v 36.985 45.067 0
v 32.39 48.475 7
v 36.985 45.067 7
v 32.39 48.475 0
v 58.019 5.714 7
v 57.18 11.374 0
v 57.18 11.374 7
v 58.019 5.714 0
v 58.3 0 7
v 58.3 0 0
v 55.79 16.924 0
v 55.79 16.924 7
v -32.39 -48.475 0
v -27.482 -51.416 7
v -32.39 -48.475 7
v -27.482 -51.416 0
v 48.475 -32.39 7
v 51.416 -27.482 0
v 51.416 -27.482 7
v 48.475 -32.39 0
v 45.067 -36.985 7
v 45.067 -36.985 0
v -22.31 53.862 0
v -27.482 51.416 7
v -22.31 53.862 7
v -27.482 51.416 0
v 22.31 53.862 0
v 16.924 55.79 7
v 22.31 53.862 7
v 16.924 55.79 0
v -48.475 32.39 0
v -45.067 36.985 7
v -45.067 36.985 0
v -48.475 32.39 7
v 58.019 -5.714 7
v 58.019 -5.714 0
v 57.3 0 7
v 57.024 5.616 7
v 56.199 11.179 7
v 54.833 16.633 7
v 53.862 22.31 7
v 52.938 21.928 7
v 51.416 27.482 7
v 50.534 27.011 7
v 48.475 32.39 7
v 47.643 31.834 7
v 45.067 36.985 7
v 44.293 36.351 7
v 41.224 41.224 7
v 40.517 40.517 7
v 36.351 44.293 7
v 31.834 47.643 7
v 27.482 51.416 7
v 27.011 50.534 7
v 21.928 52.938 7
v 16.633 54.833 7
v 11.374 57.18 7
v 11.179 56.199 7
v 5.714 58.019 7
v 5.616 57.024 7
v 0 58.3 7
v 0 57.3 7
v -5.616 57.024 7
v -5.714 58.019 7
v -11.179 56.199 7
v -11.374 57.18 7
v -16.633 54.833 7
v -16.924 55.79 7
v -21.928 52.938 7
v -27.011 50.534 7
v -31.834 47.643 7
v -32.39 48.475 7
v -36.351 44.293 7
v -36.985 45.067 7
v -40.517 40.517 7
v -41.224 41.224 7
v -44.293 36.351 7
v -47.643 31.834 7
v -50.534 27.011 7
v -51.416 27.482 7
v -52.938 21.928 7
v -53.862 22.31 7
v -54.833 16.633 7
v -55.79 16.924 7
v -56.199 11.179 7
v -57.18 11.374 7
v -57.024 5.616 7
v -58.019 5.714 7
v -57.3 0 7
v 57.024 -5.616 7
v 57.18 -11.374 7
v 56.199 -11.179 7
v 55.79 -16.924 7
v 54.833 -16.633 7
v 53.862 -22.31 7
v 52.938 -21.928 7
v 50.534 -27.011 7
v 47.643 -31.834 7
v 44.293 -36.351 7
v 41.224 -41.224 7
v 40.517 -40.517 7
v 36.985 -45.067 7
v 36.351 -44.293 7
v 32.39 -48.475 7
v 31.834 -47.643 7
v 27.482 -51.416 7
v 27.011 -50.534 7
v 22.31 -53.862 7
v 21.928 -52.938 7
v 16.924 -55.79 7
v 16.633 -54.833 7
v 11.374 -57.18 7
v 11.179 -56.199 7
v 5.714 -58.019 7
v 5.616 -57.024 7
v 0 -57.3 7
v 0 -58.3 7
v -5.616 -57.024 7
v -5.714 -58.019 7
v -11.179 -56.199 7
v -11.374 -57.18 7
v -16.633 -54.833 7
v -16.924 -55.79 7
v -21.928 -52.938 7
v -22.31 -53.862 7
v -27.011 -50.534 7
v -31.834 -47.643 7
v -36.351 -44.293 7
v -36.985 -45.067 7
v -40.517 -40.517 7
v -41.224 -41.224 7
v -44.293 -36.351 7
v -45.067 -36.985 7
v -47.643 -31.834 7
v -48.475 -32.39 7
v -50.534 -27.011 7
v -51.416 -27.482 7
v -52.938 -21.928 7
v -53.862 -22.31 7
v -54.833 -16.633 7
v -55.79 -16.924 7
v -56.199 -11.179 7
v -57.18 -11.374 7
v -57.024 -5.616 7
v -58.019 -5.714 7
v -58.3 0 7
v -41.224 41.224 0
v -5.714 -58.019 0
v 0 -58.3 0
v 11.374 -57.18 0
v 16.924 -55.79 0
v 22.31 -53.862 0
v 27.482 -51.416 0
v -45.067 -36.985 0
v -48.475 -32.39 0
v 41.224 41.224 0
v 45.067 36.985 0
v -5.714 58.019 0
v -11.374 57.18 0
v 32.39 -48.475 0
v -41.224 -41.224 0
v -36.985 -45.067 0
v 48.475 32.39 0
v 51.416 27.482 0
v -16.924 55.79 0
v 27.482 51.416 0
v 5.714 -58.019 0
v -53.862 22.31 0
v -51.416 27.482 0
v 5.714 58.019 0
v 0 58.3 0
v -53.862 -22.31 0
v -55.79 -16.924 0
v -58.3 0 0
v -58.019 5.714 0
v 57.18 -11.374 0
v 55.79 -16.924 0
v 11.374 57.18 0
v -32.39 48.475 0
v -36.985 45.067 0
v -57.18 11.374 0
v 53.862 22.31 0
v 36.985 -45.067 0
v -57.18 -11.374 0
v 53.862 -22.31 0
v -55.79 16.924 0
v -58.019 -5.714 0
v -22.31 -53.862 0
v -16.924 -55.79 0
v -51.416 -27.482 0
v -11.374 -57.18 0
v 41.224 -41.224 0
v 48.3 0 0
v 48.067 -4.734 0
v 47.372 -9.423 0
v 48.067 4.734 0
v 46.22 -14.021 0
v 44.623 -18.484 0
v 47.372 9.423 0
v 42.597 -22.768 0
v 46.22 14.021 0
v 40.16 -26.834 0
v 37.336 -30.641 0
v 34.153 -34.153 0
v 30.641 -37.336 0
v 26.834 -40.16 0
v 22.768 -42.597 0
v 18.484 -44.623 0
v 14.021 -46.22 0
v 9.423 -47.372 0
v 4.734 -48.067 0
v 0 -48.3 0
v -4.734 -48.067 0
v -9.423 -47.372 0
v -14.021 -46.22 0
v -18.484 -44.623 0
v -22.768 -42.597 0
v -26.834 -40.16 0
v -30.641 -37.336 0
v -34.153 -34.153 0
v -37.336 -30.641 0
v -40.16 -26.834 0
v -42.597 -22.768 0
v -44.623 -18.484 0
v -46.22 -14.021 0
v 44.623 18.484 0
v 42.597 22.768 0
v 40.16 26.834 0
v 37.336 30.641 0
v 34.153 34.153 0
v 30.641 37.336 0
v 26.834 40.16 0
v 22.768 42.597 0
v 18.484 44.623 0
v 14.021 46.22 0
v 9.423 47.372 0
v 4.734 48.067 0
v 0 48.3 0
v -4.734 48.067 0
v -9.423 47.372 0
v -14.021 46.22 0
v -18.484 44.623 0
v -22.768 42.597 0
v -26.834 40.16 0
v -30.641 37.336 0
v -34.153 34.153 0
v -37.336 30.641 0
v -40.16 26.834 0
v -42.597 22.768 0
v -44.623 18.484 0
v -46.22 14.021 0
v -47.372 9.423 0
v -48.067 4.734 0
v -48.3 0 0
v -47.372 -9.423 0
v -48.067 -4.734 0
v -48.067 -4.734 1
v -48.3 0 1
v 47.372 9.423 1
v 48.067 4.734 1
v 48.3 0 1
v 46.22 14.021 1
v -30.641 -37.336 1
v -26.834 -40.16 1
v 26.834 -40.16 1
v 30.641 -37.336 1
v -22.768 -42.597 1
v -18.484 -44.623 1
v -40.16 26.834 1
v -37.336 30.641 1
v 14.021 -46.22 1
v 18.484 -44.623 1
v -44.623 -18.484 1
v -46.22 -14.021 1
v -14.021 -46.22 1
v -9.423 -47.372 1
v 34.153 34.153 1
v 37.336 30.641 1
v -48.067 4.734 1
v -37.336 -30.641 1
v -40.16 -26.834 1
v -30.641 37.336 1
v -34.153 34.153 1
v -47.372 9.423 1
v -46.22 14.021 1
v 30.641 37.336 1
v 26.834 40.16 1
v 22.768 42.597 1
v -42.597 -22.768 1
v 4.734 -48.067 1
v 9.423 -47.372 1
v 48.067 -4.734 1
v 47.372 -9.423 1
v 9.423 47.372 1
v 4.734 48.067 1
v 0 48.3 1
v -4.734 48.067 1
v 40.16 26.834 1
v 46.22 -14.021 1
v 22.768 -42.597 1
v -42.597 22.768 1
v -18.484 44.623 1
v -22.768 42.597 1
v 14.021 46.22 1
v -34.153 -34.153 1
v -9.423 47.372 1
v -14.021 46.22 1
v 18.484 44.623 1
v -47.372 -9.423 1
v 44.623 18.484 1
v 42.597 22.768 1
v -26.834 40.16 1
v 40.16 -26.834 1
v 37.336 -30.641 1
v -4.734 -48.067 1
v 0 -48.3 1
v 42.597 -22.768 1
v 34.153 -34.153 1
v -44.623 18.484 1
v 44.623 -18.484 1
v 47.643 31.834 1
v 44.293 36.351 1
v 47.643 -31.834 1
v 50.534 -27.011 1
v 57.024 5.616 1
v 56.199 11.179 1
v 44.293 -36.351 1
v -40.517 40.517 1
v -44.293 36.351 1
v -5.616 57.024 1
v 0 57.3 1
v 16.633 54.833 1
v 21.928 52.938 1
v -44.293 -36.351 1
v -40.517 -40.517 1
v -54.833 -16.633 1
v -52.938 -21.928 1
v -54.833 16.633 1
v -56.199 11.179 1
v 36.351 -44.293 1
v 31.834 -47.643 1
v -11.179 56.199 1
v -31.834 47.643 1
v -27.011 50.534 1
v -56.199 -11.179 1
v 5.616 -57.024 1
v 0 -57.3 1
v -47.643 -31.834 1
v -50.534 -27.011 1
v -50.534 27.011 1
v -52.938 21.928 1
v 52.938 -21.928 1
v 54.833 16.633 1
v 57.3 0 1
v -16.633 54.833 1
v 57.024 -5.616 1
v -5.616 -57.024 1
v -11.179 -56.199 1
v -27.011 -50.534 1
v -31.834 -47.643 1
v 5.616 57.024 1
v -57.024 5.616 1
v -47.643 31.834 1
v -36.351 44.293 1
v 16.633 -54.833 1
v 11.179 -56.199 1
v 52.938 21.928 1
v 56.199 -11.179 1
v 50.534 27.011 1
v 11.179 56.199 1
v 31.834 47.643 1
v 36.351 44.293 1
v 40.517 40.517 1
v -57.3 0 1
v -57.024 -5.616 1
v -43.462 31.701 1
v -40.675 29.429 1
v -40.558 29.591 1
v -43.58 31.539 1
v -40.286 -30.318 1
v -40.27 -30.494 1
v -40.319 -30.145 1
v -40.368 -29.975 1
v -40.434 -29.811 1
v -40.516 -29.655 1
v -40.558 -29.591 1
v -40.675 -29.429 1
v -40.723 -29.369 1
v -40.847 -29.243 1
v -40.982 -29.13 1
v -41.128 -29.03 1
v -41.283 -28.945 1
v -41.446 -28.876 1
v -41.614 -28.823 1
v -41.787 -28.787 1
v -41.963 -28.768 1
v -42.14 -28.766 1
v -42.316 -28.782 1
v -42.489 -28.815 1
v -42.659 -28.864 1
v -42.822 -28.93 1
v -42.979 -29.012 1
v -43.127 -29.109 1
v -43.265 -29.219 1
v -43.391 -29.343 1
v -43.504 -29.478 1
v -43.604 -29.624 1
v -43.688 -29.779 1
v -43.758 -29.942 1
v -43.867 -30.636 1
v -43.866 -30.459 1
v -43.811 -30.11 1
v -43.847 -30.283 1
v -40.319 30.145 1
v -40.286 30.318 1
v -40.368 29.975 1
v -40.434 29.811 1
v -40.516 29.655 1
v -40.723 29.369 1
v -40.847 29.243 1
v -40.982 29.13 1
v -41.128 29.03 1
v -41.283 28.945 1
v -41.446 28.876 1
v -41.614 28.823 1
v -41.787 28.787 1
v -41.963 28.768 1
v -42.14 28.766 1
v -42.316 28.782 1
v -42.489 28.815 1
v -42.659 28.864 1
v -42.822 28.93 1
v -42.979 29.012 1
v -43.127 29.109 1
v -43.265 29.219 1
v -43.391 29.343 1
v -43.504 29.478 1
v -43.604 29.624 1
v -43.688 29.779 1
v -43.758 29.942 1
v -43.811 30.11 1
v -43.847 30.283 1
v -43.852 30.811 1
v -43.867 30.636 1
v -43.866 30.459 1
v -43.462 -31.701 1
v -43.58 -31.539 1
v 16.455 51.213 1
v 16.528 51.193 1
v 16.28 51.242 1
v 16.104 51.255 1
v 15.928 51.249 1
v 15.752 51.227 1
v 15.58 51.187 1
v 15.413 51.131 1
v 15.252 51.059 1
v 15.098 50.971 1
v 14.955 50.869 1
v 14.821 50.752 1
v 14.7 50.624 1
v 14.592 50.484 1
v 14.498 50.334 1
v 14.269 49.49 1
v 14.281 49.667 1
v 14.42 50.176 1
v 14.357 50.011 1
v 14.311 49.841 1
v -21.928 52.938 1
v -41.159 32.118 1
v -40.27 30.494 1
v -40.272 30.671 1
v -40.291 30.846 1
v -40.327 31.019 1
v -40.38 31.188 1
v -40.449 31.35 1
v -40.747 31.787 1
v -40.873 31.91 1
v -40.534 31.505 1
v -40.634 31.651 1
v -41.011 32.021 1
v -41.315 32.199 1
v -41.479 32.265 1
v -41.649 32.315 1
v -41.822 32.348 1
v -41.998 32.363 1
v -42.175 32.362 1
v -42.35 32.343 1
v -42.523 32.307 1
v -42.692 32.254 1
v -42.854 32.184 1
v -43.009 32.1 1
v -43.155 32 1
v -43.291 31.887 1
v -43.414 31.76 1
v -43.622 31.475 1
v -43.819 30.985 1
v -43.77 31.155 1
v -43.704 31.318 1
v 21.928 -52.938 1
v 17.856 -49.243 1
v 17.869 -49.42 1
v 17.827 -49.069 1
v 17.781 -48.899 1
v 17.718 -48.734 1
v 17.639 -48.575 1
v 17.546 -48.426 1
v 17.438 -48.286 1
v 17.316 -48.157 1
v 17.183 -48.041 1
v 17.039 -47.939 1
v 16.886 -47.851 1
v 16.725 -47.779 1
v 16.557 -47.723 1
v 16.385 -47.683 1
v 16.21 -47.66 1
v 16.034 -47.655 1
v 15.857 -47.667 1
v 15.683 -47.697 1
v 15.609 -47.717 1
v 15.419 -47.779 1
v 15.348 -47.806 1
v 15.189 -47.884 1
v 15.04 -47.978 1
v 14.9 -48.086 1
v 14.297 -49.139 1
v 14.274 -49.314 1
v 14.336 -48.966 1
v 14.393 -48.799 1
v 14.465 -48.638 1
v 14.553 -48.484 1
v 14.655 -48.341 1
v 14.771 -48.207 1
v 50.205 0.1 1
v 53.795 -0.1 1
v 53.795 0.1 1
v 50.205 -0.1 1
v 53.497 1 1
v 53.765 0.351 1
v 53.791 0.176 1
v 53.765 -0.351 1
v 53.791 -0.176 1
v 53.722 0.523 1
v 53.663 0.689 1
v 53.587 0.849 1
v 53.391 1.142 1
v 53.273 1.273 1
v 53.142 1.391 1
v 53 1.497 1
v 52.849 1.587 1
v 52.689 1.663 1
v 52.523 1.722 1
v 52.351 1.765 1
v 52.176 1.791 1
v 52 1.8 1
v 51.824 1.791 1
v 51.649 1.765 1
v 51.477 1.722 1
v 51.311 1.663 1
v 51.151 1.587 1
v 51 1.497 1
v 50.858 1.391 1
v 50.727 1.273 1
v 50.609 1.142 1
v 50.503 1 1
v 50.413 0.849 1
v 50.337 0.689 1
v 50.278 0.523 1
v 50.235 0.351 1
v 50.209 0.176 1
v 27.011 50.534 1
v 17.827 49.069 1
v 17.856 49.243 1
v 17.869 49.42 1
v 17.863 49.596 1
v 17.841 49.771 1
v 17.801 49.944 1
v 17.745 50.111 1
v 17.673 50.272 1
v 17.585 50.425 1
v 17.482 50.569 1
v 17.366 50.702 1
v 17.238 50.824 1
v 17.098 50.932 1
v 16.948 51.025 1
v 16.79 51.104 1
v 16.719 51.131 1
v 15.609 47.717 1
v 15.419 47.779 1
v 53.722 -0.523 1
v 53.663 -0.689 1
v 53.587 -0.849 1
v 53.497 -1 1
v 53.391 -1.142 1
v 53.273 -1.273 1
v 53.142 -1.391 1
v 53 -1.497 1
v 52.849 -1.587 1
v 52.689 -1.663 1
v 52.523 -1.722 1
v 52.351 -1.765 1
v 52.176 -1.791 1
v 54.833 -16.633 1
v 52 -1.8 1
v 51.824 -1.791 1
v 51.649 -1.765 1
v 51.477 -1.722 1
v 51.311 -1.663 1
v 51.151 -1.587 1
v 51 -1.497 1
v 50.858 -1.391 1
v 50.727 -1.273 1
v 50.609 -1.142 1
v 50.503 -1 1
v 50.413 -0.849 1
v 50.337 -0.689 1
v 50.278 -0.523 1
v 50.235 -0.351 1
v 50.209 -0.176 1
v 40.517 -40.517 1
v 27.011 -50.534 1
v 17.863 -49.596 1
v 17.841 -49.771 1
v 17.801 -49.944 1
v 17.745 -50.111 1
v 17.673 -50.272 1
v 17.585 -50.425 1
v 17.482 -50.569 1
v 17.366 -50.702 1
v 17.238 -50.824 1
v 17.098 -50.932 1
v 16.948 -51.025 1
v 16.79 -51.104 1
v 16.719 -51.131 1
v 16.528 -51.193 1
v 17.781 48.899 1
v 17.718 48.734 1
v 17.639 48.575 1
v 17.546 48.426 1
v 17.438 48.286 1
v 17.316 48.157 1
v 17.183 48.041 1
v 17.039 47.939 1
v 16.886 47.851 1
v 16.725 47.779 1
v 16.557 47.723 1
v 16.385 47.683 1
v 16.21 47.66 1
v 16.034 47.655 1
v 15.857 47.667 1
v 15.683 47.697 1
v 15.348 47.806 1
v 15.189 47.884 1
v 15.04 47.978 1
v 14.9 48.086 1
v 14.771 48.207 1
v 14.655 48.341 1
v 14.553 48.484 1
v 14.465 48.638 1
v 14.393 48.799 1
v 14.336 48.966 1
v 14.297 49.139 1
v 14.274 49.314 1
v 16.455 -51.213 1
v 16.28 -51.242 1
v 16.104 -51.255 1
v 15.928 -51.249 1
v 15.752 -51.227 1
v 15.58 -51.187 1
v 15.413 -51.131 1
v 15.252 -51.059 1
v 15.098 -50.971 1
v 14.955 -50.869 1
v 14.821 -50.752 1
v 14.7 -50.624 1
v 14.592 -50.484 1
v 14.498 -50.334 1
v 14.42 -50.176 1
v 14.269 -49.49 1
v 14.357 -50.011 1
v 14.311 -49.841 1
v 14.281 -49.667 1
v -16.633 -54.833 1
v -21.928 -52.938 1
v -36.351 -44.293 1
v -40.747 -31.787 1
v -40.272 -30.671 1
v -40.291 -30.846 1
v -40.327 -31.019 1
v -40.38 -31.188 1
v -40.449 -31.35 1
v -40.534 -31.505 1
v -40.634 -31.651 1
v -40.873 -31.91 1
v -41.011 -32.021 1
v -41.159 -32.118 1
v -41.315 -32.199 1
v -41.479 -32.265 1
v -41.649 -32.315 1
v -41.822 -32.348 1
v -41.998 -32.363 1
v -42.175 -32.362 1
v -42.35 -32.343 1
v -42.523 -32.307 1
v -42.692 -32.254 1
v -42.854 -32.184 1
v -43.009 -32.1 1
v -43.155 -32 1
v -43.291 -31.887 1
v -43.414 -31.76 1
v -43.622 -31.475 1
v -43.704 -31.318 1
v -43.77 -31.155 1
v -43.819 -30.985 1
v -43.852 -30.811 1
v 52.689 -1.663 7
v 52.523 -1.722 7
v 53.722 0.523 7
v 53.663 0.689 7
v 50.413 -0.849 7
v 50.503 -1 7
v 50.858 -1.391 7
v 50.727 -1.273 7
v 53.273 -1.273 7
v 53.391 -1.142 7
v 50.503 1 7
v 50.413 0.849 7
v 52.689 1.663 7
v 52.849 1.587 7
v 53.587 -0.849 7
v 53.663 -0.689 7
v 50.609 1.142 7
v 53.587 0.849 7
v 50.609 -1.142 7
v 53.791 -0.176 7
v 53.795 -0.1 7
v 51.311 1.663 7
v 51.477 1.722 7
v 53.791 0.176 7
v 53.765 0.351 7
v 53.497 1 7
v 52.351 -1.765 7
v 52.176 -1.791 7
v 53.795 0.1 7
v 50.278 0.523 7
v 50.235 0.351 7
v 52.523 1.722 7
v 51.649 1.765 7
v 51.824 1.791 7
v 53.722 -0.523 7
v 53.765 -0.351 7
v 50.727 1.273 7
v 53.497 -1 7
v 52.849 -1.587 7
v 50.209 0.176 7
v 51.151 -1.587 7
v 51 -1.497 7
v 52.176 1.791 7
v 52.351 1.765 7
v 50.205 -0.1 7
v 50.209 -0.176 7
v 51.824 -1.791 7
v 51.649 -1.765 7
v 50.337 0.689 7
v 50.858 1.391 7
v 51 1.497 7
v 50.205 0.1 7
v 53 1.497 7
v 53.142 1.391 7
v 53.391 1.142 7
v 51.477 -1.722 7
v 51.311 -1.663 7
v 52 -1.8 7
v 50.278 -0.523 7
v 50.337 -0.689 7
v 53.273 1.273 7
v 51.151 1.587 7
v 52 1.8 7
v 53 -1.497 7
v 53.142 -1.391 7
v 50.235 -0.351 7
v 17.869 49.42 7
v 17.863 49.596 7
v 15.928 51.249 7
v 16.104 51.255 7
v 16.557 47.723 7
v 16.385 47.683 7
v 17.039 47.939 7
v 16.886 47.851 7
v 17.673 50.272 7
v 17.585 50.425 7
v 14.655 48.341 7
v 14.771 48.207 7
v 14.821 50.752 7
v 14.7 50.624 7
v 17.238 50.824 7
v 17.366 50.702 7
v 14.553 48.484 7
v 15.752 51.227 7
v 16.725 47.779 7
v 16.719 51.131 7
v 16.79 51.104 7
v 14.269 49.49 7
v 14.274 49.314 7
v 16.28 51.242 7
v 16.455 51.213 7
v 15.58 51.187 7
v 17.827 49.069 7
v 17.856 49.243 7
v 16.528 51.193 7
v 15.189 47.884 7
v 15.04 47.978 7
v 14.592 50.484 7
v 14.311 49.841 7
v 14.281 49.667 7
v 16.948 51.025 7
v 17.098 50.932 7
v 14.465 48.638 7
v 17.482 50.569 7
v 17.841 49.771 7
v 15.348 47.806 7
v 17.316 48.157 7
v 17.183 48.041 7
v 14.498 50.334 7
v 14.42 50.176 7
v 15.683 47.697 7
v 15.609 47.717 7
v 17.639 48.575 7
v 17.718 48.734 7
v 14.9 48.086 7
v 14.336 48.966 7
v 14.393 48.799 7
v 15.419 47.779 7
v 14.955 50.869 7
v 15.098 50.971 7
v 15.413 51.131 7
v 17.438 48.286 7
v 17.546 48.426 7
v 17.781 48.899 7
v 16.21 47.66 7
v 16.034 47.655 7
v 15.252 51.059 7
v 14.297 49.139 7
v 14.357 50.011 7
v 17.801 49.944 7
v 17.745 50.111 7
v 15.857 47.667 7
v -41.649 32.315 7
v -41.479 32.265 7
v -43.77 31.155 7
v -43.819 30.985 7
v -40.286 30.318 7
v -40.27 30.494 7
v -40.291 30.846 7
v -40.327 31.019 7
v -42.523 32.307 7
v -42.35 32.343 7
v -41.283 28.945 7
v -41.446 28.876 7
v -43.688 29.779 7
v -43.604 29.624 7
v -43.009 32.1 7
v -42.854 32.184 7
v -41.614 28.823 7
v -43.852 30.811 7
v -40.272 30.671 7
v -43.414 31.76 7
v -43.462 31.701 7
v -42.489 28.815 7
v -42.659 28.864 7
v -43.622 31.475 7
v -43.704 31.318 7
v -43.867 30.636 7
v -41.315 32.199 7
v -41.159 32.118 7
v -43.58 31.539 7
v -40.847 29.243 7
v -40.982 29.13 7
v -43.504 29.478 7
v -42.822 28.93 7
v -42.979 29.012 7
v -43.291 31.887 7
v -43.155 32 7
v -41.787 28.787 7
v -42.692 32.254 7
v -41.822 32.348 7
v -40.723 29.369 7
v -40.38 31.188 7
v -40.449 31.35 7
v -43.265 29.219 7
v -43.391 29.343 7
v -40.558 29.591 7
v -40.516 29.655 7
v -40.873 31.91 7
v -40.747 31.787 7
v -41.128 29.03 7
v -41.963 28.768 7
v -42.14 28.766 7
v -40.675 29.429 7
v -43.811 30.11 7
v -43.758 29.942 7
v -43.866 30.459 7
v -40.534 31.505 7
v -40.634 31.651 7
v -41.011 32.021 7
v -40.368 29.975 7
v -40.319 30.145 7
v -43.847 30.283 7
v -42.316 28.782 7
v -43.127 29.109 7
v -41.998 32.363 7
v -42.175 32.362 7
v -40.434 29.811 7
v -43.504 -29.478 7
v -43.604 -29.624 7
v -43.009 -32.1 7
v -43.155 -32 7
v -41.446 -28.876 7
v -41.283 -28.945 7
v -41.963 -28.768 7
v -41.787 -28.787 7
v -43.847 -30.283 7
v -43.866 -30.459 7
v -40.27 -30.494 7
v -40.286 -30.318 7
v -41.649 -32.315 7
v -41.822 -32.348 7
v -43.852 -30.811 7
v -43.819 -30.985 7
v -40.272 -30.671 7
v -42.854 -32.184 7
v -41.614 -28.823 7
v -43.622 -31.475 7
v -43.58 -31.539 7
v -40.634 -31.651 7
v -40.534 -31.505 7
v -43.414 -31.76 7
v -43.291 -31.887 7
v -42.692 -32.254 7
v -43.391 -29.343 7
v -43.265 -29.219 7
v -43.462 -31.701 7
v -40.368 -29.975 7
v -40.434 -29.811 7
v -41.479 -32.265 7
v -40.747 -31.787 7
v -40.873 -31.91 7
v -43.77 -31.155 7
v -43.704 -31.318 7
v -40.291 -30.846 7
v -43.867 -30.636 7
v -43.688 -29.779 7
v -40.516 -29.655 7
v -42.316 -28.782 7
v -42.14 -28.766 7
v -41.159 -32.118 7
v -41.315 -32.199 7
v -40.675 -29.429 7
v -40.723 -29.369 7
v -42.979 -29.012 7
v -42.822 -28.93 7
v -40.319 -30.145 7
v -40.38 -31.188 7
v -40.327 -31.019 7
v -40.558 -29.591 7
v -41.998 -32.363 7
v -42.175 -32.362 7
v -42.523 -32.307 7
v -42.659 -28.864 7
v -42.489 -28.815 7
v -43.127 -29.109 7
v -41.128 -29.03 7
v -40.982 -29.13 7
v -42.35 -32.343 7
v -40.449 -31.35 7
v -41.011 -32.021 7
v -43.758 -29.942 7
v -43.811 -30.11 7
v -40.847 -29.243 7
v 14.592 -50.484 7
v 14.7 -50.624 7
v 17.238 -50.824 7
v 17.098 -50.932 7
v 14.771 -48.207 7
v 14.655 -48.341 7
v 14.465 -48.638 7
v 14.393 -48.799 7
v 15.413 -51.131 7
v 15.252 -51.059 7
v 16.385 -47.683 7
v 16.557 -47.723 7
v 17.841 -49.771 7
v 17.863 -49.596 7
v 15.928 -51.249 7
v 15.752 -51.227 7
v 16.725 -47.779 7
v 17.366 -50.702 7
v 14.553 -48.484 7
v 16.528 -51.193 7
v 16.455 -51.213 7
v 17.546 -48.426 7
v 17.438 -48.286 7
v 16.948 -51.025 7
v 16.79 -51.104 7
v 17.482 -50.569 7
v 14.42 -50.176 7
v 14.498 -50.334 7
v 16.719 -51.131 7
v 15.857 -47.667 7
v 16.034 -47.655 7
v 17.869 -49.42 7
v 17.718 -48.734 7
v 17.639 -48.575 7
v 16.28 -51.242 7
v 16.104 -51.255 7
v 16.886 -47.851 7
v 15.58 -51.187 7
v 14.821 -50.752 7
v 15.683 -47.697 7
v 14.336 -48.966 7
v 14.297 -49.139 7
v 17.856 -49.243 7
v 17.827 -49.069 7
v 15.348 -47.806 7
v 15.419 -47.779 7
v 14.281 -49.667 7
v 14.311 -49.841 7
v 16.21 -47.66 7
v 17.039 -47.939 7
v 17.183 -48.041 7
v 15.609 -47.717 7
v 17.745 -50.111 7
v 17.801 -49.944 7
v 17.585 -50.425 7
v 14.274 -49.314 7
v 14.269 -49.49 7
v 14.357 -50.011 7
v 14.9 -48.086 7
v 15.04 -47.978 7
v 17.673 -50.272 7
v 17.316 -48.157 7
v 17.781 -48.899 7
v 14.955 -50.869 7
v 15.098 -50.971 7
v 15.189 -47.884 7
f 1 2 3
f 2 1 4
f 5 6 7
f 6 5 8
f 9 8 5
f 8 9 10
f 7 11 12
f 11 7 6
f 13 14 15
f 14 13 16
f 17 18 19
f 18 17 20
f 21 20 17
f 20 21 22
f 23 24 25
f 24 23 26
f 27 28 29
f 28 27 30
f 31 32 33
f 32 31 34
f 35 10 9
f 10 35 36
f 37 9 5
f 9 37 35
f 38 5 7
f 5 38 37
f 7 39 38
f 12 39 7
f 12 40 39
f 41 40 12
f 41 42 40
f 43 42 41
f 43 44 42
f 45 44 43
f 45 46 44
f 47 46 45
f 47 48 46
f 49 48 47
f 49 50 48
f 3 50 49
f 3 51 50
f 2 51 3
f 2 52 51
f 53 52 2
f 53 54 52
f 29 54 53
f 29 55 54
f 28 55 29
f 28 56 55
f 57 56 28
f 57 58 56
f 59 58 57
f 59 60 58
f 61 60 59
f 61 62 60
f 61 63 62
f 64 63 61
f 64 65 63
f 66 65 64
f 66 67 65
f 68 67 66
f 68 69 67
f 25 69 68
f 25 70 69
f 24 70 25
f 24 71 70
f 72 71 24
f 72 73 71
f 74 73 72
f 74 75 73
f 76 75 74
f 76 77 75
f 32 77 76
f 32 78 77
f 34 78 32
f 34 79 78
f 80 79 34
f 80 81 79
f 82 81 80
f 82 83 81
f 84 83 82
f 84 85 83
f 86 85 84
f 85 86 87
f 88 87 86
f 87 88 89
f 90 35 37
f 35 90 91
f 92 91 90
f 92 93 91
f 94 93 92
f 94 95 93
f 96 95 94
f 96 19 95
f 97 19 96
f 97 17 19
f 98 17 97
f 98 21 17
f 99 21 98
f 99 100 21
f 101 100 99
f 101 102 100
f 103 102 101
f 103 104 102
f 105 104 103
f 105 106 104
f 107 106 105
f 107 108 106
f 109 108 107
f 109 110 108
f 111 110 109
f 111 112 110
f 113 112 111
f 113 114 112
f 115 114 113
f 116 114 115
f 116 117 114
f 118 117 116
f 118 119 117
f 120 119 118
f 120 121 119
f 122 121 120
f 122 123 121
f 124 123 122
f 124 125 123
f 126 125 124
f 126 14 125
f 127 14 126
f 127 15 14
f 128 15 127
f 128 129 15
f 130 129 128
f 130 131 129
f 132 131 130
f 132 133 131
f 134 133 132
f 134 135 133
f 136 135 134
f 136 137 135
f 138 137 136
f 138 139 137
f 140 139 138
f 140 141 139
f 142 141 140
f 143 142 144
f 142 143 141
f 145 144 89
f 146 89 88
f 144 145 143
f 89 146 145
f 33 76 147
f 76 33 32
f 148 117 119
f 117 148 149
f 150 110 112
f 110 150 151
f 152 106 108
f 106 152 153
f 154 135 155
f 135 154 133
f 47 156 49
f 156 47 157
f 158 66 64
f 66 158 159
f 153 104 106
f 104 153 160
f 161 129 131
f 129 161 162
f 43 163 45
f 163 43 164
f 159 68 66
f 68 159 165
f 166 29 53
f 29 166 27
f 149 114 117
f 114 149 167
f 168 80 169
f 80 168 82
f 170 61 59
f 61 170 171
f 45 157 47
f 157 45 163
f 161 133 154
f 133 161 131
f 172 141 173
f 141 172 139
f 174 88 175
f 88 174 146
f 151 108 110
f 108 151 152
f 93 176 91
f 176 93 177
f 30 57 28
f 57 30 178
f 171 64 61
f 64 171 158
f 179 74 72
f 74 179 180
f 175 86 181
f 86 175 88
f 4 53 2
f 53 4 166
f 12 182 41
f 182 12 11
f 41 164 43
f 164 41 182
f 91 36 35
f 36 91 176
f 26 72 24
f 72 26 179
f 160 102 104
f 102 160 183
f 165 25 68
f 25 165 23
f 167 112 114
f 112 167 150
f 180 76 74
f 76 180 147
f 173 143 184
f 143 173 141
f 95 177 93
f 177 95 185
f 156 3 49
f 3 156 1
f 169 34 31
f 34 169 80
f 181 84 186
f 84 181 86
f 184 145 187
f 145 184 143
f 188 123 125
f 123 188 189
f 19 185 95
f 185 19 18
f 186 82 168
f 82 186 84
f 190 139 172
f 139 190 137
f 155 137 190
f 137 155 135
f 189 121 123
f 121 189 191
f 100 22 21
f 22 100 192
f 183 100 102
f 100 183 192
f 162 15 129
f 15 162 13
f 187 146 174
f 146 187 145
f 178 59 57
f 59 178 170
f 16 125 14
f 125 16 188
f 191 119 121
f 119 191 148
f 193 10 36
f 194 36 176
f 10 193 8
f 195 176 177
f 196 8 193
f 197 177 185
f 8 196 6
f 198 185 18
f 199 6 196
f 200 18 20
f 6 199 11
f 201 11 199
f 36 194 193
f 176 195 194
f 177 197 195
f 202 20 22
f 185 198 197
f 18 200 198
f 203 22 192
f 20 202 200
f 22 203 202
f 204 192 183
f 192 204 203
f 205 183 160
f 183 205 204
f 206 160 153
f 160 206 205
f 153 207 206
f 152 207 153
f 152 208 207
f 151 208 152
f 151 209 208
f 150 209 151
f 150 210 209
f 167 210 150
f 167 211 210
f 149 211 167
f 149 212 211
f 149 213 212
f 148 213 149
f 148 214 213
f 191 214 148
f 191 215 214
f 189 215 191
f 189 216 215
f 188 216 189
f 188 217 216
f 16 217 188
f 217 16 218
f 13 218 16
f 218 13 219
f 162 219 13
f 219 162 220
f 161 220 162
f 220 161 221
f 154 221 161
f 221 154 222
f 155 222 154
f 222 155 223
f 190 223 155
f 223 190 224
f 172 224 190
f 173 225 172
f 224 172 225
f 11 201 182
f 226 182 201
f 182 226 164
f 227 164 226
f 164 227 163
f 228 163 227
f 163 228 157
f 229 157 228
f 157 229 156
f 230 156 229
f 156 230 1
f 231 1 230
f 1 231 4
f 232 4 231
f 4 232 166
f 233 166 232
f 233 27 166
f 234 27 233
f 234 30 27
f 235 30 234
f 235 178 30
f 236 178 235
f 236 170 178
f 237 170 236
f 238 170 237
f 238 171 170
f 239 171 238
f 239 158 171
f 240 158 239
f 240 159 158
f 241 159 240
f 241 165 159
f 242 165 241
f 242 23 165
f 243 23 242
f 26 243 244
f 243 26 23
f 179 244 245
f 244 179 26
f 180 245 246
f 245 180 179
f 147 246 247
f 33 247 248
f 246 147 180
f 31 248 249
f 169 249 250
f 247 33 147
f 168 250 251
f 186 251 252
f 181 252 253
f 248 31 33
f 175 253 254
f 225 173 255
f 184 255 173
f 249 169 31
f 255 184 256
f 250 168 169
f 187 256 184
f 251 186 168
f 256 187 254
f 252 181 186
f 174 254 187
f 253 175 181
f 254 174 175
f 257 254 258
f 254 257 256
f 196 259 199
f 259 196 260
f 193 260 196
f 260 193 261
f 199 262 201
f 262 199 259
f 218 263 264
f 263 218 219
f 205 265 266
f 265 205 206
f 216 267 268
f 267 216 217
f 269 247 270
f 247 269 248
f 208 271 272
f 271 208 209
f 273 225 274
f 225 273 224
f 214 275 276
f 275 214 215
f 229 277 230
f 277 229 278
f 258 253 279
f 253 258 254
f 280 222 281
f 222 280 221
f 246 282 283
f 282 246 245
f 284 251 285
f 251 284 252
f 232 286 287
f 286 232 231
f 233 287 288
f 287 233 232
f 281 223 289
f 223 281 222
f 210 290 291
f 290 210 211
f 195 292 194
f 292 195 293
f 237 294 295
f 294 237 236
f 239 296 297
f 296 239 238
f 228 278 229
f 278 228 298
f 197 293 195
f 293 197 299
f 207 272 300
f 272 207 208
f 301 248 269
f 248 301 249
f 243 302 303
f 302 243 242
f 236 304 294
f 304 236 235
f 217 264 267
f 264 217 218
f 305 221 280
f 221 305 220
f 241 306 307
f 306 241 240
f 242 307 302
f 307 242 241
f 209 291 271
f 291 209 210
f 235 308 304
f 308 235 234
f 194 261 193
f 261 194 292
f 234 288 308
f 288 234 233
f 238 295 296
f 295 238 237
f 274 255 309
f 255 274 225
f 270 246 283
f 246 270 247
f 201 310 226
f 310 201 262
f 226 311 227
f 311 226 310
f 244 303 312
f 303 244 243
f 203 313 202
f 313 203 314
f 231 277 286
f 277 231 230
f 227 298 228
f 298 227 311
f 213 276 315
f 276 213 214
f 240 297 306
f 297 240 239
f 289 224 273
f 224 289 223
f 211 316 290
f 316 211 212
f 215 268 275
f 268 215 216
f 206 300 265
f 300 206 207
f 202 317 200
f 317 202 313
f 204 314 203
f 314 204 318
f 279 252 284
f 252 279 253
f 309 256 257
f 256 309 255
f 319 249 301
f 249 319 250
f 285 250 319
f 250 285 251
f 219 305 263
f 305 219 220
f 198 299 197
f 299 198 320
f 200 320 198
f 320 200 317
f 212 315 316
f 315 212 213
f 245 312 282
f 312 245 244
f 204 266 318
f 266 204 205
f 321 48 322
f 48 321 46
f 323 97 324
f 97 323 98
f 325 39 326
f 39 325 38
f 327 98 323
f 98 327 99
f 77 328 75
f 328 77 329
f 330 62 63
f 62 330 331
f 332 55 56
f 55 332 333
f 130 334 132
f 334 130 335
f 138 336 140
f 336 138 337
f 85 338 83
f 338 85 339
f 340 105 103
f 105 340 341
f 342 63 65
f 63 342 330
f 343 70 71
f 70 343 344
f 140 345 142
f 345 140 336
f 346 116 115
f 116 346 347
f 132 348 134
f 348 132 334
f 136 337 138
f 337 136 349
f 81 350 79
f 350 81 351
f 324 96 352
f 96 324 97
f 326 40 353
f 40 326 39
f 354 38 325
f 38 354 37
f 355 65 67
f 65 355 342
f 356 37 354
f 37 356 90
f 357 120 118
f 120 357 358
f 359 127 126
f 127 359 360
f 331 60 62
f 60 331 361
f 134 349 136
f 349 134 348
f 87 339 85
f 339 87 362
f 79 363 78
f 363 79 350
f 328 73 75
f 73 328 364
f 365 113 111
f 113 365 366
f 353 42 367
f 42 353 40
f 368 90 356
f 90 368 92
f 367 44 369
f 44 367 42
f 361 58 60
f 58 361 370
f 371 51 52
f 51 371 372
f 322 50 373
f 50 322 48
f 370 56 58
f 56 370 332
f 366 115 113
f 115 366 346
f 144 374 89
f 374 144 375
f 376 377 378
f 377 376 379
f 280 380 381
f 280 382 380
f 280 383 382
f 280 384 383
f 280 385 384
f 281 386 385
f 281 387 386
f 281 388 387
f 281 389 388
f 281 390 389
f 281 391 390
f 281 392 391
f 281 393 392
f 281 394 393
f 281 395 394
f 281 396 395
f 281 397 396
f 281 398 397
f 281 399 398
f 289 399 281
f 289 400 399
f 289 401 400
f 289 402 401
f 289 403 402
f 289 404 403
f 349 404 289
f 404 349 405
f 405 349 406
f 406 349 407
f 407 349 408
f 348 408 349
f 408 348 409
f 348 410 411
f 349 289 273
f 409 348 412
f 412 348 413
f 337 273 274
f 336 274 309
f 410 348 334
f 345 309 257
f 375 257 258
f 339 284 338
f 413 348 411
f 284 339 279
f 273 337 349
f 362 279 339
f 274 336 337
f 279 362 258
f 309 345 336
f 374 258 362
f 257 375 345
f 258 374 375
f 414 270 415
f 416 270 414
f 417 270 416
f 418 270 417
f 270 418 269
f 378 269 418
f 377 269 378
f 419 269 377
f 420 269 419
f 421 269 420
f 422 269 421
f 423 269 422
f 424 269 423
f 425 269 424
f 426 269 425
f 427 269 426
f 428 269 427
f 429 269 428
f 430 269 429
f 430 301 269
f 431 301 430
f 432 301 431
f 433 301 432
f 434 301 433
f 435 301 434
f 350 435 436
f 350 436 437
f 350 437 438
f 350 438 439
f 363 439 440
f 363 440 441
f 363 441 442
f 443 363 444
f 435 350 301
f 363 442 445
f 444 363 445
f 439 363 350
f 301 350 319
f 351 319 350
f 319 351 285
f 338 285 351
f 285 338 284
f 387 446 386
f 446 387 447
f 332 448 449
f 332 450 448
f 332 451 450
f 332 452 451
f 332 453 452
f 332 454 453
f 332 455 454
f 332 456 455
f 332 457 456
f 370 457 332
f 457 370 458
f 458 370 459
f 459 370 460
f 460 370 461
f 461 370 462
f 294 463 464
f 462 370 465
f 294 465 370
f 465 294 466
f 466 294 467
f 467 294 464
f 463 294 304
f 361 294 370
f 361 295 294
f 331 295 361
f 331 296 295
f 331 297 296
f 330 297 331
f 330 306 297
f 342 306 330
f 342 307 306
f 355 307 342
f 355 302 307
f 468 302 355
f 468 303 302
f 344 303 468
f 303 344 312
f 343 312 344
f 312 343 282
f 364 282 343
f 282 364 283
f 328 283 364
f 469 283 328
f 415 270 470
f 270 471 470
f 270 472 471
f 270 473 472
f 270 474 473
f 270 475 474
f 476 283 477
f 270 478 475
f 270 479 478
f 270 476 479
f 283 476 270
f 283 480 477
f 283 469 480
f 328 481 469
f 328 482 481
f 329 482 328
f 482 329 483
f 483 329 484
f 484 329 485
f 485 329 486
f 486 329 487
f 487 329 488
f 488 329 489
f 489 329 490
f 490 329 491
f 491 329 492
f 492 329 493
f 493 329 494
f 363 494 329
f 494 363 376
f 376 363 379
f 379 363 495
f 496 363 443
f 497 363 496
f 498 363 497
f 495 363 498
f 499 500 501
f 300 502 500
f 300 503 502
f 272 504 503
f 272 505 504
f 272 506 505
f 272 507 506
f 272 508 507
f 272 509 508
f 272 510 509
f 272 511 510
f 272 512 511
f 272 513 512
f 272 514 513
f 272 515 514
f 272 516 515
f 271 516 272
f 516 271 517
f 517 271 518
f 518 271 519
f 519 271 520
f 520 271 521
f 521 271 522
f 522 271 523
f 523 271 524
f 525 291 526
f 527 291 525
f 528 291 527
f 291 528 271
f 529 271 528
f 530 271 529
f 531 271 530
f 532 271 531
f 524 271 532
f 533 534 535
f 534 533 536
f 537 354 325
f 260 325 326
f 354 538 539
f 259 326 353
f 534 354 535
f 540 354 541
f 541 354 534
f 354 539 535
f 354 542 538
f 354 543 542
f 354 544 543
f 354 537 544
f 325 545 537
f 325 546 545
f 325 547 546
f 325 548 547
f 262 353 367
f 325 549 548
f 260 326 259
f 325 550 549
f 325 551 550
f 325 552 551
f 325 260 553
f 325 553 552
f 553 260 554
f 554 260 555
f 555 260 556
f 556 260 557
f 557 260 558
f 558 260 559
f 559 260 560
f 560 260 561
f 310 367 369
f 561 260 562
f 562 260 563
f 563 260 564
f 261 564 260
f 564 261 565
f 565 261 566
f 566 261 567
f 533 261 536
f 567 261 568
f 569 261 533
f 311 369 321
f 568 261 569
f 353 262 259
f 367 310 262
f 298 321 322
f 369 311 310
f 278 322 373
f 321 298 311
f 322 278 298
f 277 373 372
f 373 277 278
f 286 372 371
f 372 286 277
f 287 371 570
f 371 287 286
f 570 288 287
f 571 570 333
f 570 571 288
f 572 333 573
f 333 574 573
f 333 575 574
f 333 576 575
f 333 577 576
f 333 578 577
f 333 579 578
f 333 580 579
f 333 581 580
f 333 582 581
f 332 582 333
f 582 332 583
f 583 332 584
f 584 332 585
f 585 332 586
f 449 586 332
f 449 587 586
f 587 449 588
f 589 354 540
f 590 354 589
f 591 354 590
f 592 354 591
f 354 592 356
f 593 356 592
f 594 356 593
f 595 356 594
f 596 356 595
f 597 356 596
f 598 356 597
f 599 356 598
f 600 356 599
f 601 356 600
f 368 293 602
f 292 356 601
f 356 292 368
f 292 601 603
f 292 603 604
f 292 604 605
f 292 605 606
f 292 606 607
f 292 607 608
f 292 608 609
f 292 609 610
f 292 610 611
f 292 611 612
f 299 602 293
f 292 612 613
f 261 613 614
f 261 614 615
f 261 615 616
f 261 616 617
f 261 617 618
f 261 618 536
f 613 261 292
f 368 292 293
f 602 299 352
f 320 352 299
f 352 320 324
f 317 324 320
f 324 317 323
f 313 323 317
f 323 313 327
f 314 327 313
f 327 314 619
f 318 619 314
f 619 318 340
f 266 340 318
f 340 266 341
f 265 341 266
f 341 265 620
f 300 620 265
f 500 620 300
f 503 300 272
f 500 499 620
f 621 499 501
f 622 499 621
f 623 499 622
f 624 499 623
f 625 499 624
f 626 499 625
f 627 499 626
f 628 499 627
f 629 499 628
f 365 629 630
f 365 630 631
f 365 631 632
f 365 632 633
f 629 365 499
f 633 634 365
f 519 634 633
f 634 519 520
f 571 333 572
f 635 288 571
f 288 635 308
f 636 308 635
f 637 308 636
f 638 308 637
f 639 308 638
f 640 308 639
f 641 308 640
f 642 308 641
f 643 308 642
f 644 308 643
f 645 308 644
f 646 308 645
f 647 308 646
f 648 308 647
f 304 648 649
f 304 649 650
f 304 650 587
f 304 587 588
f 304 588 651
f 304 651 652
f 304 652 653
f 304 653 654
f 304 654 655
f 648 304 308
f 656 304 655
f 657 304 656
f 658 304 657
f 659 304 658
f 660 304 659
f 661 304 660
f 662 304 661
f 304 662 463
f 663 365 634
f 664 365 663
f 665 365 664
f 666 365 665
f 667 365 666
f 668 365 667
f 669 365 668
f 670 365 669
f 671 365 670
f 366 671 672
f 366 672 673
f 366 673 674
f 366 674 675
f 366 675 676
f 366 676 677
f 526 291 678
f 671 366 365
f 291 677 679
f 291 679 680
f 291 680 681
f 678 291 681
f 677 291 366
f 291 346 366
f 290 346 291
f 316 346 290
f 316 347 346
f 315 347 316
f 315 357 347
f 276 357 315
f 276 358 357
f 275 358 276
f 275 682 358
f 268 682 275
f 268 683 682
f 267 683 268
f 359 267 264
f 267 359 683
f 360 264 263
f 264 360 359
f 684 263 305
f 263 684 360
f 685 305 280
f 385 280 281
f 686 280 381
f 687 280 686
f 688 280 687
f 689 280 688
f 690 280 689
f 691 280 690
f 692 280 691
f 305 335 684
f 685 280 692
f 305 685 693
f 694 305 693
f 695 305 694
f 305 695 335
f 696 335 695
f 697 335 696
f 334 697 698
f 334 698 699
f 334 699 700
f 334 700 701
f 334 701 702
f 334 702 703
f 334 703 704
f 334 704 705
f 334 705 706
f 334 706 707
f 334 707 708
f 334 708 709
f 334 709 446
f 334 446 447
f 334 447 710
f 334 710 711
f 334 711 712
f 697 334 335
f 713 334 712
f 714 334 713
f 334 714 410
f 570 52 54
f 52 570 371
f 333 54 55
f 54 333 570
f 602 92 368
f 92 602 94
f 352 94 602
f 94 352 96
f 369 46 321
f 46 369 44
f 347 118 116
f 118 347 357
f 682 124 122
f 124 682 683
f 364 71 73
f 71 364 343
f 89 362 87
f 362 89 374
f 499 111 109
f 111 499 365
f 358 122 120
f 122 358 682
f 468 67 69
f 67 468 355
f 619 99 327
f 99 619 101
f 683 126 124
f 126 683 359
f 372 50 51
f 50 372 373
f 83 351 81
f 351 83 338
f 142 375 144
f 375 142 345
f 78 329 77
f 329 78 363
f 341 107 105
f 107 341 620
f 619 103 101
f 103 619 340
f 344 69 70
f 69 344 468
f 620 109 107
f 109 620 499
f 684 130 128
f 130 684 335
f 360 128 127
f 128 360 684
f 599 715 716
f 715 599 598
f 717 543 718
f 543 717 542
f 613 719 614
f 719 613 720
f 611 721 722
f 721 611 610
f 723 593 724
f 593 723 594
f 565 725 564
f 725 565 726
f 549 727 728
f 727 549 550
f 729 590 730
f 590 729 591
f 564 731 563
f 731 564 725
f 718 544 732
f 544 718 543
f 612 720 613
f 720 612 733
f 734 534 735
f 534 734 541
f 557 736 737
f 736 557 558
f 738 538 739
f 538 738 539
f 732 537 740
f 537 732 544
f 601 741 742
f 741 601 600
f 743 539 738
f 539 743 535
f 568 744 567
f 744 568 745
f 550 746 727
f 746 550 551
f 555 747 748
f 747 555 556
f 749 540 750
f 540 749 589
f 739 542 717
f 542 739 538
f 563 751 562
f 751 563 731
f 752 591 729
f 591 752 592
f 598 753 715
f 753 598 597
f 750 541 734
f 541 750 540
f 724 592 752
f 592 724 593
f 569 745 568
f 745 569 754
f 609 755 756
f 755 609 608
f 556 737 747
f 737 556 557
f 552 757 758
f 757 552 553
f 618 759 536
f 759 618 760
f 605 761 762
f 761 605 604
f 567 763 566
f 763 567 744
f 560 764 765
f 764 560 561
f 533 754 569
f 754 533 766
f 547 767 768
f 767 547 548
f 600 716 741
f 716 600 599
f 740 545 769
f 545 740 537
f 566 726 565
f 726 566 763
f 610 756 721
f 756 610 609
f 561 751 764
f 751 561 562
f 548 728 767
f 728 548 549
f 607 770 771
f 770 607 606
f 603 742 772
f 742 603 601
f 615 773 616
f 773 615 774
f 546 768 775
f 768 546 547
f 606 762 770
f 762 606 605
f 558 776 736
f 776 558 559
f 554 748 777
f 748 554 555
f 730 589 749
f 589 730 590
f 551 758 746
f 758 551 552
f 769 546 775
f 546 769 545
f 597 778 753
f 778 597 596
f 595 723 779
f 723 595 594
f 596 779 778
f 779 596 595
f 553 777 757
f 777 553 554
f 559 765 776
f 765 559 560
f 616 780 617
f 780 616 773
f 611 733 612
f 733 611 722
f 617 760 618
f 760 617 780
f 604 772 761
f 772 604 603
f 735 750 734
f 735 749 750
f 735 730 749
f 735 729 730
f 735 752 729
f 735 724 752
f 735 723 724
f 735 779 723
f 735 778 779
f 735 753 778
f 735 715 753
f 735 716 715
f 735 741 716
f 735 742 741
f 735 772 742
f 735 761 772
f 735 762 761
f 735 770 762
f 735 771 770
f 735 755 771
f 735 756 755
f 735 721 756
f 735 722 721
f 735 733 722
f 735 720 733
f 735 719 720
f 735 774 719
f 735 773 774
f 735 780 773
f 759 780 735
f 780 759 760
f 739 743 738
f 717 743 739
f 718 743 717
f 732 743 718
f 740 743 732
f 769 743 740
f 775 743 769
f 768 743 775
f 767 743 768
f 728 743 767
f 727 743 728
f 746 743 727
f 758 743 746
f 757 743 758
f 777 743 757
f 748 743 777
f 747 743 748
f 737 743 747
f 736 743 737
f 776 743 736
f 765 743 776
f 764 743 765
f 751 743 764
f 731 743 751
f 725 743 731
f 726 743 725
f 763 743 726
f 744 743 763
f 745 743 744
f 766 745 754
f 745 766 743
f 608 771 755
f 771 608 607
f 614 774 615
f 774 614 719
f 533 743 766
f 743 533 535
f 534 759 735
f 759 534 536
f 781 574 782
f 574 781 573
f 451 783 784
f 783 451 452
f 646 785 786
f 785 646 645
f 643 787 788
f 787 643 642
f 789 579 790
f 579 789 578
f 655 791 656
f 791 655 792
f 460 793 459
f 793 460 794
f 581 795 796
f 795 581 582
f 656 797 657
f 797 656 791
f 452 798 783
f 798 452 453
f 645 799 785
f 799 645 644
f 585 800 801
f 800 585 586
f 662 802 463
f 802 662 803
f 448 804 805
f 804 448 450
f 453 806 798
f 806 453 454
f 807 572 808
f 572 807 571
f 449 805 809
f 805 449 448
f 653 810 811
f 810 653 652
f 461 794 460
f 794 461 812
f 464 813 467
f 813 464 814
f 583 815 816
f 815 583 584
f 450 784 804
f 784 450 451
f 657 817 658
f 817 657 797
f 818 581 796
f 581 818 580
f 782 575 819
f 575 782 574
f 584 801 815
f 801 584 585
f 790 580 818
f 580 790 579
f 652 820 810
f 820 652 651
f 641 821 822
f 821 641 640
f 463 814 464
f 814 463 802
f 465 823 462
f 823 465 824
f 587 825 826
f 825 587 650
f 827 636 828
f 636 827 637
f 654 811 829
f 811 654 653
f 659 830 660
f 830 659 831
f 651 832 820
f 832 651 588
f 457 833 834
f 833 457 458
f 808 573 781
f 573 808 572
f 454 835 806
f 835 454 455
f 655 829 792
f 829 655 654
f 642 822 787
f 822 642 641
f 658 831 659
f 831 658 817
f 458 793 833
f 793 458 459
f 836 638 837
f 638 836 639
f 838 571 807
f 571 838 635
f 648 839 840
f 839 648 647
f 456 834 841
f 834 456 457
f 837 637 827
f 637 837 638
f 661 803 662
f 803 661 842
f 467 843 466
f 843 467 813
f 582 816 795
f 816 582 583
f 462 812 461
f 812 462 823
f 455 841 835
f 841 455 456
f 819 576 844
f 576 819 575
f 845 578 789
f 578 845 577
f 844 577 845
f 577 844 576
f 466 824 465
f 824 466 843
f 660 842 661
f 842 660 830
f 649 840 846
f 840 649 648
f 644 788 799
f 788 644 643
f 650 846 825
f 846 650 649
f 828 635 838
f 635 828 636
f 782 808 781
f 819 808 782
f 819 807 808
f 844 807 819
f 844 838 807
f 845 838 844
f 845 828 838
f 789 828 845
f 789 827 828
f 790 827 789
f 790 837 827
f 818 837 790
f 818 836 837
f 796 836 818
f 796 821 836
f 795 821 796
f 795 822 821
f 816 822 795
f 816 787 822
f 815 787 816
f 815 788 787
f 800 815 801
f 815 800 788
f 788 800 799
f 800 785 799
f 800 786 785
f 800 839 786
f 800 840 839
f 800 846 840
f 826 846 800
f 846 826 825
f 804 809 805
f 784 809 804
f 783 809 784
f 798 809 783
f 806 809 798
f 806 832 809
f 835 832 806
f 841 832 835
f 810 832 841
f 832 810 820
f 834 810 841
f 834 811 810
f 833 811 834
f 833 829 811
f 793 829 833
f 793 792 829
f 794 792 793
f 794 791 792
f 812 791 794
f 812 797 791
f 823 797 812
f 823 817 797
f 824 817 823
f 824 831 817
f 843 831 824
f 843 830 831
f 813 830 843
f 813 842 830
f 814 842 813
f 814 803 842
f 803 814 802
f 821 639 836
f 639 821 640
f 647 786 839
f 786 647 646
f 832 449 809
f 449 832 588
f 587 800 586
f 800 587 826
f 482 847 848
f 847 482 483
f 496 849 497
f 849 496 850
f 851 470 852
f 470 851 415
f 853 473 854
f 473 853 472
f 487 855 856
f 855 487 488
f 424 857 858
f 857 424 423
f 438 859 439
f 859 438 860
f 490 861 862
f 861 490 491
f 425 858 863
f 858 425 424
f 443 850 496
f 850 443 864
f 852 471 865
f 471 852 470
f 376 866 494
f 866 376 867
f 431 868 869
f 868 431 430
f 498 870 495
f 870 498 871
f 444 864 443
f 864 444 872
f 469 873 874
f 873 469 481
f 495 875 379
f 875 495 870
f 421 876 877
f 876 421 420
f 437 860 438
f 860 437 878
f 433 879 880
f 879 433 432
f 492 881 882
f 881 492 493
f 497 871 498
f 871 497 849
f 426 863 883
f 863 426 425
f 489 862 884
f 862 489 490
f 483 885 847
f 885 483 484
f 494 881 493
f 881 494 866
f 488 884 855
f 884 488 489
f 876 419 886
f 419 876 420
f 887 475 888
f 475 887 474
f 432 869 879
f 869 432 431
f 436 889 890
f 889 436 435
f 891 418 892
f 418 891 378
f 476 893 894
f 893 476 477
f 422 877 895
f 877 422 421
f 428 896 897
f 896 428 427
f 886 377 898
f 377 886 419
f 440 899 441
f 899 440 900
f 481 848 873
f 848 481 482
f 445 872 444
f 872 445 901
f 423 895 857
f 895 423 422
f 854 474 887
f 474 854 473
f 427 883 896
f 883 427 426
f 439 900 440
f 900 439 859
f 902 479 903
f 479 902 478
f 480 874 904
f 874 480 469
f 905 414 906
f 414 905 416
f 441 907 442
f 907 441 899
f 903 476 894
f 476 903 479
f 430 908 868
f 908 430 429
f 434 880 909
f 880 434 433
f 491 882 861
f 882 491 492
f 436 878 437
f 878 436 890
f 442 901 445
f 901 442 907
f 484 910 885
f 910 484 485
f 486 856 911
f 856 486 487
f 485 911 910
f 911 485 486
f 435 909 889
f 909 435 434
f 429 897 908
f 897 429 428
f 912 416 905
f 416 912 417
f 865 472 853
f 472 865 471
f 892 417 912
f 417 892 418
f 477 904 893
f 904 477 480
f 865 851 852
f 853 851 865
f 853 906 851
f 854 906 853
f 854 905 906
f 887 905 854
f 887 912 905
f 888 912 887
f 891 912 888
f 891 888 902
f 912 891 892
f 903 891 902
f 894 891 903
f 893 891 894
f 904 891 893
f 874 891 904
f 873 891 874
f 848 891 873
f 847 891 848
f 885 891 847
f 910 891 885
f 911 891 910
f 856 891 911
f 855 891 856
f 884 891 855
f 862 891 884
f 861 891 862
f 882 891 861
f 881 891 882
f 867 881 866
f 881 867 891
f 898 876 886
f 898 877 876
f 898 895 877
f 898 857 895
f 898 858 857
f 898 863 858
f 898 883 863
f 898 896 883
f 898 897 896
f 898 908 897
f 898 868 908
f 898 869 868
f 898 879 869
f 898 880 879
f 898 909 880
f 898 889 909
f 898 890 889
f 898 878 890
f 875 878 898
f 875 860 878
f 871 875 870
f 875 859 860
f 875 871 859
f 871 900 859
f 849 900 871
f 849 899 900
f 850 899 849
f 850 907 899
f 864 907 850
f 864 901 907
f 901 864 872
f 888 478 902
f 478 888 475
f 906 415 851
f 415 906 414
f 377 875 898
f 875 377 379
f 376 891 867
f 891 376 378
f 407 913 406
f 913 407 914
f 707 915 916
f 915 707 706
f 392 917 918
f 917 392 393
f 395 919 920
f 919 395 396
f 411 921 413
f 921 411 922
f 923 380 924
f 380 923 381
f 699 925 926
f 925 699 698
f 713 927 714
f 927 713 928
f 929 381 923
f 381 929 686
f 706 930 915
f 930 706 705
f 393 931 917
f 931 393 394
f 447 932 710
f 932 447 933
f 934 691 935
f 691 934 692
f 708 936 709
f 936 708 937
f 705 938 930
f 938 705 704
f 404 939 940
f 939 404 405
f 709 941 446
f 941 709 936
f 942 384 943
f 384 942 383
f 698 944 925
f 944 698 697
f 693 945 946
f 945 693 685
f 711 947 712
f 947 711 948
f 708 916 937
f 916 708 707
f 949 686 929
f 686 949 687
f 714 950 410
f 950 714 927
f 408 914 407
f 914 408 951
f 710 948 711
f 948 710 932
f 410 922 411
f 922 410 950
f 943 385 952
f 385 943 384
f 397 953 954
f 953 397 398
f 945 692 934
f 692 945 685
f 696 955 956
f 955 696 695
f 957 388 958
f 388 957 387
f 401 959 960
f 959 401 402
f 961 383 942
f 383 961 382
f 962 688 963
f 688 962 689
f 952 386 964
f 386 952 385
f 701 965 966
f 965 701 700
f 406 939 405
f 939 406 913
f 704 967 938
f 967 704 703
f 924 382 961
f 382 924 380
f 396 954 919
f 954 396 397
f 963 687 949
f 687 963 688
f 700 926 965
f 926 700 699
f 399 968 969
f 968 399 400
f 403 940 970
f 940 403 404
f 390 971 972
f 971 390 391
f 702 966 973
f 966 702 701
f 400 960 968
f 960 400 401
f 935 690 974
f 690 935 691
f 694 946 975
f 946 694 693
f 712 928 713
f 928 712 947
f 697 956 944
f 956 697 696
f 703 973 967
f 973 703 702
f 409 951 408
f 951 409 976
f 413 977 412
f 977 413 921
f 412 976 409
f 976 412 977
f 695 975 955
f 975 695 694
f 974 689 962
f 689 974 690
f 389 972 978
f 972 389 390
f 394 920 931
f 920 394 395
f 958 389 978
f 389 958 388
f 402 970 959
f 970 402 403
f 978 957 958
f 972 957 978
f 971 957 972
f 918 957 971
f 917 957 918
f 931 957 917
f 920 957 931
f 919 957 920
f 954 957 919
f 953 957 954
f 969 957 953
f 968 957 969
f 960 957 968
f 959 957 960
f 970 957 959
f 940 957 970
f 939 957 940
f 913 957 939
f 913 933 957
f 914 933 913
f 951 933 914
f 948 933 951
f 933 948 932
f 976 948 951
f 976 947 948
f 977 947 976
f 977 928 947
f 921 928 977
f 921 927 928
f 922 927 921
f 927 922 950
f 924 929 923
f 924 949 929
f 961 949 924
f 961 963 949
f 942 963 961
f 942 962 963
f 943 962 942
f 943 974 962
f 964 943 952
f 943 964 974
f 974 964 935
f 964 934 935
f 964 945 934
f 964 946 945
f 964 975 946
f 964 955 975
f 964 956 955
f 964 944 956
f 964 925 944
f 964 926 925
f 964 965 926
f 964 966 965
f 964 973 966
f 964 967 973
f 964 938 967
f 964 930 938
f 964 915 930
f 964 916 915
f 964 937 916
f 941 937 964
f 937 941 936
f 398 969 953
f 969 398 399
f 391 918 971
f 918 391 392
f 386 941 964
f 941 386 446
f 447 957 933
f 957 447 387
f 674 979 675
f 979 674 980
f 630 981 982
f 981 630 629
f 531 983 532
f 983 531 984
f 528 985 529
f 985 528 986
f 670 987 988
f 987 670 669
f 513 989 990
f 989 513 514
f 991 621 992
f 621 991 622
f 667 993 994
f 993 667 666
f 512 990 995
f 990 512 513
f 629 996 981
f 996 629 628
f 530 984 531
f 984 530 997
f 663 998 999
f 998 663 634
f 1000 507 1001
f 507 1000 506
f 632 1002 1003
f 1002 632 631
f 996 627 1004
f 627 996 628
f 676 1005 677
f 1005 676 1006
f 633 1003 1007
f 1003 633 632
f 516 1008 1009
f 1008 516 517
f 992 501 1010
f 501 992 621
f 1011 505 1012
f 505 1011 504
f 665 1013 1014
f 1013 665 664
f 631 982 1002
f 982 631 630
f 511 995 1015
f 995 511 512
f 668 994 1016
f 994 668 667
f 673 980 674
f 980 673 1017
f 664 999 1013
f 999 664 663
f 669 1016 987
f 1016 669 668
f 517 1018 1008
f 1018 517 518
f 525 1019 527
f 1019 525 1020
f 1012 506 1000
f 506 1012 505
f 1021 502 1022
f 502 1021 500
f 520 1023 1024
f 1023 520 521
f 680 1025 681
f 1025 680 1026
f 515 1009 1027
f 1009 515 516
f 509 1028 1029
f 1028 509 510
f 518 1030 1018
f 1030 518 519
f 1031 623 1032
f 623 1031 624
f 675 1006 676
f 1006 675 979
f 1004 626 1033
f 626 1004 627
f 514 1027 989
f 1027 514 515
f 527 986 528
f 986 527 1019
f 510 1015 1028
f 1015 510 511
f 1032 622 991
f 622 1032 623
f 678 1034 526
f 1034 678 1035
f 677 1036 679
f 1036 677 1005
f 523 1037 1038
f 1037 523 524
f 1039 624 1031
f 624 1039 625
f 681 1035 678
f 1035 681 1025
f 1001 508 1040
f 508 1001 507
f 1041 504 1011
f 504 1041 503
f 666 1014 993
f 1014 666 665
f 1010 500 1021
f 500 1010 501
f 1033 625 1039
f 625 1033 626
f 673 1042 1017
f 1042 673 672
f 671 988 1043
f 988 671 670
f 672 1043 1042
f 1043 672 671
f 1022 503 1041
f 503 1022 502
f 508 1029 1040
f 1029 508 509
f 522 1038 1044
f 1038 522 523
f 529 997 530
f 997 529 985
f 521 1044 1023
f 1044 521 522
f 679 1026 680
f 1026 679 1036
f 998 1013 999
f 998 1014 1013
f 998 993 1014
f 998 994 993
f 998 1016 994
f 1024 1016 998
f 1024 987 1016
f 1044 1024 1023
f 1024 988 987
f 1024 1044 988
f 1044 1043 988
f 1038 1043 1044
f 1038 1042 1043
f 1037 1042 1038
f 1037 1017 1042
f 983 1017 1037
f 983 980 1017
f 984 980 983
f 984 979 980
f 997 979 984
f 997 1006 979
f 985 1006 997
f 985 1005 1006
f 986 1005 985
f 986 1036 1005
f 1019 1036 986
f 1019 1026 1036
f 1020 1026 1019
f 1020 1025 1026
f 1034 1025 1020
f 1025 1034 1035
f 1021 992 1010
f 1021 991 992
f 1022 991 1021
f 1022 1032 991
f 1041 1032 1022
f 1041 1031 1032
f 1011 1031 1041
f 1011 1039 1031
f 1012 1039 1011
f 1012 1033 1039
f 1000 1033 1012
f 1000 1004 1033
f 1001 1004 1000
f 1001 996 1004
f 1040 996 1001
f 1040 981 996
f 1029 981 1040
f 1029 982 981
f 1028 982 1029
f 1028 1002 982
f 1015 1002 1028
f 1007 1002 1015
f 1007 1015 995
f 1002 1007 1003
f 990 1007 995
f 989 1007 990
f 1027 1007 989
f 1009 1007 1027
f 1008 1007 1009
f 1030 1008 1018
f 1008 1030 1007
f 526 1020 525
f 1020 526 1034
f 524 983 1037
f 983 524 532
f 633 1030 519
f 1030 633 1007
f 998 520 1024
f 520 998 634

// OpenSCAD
$fn = 64;
epsilon = 0.01;

module bolt(boltRadius, boltGap, boltHeight) {
    difference() {
        cylinder(r = boltRadius, h = boltHeight);
        translate([-boltRadius, -boltGap / 2, -epsilon])
            cube([boltRadius * 2, boltGap, boltHeight + (2 * epsilon)]);
    }
}

module popFilterCap(capRadius, capHeight, floorThickness, wallThickness, floorExtent, boltRadius, boltGap, boltDistance, numBolts, boltDegreeOffset) {
    difference() {
        cylinder(r = capRadius, h = capHeight);
        translate([0, 0, -epsilon])
            cylinder(r = capRadius - floorExtent, h = capHeight + (2 * epsilon));
        translate([0, 0, floorThickness])
            cylinder(r = capRadius - wallThickness, h = capHeight);
    }
    for(i = [0: numBolts]) {
        rotate([0, 0, (i * (360 / numBolts)) + boltDegreeOffset])
            translate([boltDistance, 0 , 0])
            bolt(boltRadius, boltGap, capHeight);
    }
}

capRadius = 58.3;
capHeight = 7;
floorThickness = 1;
wallThickness = 1;
floorExtent = 10;

boltRadius = 1.8;
boltGap = 0.2;
boltDistance = 52;
numBolts = 5;
boltDegreeOffset = 0;

popFilterCap(capRadius, capHeight, floorThickness, wallThickness, floorExtent, boltRadius, boltGap, boltDistance, numBolts, boltDegreeOffset);
